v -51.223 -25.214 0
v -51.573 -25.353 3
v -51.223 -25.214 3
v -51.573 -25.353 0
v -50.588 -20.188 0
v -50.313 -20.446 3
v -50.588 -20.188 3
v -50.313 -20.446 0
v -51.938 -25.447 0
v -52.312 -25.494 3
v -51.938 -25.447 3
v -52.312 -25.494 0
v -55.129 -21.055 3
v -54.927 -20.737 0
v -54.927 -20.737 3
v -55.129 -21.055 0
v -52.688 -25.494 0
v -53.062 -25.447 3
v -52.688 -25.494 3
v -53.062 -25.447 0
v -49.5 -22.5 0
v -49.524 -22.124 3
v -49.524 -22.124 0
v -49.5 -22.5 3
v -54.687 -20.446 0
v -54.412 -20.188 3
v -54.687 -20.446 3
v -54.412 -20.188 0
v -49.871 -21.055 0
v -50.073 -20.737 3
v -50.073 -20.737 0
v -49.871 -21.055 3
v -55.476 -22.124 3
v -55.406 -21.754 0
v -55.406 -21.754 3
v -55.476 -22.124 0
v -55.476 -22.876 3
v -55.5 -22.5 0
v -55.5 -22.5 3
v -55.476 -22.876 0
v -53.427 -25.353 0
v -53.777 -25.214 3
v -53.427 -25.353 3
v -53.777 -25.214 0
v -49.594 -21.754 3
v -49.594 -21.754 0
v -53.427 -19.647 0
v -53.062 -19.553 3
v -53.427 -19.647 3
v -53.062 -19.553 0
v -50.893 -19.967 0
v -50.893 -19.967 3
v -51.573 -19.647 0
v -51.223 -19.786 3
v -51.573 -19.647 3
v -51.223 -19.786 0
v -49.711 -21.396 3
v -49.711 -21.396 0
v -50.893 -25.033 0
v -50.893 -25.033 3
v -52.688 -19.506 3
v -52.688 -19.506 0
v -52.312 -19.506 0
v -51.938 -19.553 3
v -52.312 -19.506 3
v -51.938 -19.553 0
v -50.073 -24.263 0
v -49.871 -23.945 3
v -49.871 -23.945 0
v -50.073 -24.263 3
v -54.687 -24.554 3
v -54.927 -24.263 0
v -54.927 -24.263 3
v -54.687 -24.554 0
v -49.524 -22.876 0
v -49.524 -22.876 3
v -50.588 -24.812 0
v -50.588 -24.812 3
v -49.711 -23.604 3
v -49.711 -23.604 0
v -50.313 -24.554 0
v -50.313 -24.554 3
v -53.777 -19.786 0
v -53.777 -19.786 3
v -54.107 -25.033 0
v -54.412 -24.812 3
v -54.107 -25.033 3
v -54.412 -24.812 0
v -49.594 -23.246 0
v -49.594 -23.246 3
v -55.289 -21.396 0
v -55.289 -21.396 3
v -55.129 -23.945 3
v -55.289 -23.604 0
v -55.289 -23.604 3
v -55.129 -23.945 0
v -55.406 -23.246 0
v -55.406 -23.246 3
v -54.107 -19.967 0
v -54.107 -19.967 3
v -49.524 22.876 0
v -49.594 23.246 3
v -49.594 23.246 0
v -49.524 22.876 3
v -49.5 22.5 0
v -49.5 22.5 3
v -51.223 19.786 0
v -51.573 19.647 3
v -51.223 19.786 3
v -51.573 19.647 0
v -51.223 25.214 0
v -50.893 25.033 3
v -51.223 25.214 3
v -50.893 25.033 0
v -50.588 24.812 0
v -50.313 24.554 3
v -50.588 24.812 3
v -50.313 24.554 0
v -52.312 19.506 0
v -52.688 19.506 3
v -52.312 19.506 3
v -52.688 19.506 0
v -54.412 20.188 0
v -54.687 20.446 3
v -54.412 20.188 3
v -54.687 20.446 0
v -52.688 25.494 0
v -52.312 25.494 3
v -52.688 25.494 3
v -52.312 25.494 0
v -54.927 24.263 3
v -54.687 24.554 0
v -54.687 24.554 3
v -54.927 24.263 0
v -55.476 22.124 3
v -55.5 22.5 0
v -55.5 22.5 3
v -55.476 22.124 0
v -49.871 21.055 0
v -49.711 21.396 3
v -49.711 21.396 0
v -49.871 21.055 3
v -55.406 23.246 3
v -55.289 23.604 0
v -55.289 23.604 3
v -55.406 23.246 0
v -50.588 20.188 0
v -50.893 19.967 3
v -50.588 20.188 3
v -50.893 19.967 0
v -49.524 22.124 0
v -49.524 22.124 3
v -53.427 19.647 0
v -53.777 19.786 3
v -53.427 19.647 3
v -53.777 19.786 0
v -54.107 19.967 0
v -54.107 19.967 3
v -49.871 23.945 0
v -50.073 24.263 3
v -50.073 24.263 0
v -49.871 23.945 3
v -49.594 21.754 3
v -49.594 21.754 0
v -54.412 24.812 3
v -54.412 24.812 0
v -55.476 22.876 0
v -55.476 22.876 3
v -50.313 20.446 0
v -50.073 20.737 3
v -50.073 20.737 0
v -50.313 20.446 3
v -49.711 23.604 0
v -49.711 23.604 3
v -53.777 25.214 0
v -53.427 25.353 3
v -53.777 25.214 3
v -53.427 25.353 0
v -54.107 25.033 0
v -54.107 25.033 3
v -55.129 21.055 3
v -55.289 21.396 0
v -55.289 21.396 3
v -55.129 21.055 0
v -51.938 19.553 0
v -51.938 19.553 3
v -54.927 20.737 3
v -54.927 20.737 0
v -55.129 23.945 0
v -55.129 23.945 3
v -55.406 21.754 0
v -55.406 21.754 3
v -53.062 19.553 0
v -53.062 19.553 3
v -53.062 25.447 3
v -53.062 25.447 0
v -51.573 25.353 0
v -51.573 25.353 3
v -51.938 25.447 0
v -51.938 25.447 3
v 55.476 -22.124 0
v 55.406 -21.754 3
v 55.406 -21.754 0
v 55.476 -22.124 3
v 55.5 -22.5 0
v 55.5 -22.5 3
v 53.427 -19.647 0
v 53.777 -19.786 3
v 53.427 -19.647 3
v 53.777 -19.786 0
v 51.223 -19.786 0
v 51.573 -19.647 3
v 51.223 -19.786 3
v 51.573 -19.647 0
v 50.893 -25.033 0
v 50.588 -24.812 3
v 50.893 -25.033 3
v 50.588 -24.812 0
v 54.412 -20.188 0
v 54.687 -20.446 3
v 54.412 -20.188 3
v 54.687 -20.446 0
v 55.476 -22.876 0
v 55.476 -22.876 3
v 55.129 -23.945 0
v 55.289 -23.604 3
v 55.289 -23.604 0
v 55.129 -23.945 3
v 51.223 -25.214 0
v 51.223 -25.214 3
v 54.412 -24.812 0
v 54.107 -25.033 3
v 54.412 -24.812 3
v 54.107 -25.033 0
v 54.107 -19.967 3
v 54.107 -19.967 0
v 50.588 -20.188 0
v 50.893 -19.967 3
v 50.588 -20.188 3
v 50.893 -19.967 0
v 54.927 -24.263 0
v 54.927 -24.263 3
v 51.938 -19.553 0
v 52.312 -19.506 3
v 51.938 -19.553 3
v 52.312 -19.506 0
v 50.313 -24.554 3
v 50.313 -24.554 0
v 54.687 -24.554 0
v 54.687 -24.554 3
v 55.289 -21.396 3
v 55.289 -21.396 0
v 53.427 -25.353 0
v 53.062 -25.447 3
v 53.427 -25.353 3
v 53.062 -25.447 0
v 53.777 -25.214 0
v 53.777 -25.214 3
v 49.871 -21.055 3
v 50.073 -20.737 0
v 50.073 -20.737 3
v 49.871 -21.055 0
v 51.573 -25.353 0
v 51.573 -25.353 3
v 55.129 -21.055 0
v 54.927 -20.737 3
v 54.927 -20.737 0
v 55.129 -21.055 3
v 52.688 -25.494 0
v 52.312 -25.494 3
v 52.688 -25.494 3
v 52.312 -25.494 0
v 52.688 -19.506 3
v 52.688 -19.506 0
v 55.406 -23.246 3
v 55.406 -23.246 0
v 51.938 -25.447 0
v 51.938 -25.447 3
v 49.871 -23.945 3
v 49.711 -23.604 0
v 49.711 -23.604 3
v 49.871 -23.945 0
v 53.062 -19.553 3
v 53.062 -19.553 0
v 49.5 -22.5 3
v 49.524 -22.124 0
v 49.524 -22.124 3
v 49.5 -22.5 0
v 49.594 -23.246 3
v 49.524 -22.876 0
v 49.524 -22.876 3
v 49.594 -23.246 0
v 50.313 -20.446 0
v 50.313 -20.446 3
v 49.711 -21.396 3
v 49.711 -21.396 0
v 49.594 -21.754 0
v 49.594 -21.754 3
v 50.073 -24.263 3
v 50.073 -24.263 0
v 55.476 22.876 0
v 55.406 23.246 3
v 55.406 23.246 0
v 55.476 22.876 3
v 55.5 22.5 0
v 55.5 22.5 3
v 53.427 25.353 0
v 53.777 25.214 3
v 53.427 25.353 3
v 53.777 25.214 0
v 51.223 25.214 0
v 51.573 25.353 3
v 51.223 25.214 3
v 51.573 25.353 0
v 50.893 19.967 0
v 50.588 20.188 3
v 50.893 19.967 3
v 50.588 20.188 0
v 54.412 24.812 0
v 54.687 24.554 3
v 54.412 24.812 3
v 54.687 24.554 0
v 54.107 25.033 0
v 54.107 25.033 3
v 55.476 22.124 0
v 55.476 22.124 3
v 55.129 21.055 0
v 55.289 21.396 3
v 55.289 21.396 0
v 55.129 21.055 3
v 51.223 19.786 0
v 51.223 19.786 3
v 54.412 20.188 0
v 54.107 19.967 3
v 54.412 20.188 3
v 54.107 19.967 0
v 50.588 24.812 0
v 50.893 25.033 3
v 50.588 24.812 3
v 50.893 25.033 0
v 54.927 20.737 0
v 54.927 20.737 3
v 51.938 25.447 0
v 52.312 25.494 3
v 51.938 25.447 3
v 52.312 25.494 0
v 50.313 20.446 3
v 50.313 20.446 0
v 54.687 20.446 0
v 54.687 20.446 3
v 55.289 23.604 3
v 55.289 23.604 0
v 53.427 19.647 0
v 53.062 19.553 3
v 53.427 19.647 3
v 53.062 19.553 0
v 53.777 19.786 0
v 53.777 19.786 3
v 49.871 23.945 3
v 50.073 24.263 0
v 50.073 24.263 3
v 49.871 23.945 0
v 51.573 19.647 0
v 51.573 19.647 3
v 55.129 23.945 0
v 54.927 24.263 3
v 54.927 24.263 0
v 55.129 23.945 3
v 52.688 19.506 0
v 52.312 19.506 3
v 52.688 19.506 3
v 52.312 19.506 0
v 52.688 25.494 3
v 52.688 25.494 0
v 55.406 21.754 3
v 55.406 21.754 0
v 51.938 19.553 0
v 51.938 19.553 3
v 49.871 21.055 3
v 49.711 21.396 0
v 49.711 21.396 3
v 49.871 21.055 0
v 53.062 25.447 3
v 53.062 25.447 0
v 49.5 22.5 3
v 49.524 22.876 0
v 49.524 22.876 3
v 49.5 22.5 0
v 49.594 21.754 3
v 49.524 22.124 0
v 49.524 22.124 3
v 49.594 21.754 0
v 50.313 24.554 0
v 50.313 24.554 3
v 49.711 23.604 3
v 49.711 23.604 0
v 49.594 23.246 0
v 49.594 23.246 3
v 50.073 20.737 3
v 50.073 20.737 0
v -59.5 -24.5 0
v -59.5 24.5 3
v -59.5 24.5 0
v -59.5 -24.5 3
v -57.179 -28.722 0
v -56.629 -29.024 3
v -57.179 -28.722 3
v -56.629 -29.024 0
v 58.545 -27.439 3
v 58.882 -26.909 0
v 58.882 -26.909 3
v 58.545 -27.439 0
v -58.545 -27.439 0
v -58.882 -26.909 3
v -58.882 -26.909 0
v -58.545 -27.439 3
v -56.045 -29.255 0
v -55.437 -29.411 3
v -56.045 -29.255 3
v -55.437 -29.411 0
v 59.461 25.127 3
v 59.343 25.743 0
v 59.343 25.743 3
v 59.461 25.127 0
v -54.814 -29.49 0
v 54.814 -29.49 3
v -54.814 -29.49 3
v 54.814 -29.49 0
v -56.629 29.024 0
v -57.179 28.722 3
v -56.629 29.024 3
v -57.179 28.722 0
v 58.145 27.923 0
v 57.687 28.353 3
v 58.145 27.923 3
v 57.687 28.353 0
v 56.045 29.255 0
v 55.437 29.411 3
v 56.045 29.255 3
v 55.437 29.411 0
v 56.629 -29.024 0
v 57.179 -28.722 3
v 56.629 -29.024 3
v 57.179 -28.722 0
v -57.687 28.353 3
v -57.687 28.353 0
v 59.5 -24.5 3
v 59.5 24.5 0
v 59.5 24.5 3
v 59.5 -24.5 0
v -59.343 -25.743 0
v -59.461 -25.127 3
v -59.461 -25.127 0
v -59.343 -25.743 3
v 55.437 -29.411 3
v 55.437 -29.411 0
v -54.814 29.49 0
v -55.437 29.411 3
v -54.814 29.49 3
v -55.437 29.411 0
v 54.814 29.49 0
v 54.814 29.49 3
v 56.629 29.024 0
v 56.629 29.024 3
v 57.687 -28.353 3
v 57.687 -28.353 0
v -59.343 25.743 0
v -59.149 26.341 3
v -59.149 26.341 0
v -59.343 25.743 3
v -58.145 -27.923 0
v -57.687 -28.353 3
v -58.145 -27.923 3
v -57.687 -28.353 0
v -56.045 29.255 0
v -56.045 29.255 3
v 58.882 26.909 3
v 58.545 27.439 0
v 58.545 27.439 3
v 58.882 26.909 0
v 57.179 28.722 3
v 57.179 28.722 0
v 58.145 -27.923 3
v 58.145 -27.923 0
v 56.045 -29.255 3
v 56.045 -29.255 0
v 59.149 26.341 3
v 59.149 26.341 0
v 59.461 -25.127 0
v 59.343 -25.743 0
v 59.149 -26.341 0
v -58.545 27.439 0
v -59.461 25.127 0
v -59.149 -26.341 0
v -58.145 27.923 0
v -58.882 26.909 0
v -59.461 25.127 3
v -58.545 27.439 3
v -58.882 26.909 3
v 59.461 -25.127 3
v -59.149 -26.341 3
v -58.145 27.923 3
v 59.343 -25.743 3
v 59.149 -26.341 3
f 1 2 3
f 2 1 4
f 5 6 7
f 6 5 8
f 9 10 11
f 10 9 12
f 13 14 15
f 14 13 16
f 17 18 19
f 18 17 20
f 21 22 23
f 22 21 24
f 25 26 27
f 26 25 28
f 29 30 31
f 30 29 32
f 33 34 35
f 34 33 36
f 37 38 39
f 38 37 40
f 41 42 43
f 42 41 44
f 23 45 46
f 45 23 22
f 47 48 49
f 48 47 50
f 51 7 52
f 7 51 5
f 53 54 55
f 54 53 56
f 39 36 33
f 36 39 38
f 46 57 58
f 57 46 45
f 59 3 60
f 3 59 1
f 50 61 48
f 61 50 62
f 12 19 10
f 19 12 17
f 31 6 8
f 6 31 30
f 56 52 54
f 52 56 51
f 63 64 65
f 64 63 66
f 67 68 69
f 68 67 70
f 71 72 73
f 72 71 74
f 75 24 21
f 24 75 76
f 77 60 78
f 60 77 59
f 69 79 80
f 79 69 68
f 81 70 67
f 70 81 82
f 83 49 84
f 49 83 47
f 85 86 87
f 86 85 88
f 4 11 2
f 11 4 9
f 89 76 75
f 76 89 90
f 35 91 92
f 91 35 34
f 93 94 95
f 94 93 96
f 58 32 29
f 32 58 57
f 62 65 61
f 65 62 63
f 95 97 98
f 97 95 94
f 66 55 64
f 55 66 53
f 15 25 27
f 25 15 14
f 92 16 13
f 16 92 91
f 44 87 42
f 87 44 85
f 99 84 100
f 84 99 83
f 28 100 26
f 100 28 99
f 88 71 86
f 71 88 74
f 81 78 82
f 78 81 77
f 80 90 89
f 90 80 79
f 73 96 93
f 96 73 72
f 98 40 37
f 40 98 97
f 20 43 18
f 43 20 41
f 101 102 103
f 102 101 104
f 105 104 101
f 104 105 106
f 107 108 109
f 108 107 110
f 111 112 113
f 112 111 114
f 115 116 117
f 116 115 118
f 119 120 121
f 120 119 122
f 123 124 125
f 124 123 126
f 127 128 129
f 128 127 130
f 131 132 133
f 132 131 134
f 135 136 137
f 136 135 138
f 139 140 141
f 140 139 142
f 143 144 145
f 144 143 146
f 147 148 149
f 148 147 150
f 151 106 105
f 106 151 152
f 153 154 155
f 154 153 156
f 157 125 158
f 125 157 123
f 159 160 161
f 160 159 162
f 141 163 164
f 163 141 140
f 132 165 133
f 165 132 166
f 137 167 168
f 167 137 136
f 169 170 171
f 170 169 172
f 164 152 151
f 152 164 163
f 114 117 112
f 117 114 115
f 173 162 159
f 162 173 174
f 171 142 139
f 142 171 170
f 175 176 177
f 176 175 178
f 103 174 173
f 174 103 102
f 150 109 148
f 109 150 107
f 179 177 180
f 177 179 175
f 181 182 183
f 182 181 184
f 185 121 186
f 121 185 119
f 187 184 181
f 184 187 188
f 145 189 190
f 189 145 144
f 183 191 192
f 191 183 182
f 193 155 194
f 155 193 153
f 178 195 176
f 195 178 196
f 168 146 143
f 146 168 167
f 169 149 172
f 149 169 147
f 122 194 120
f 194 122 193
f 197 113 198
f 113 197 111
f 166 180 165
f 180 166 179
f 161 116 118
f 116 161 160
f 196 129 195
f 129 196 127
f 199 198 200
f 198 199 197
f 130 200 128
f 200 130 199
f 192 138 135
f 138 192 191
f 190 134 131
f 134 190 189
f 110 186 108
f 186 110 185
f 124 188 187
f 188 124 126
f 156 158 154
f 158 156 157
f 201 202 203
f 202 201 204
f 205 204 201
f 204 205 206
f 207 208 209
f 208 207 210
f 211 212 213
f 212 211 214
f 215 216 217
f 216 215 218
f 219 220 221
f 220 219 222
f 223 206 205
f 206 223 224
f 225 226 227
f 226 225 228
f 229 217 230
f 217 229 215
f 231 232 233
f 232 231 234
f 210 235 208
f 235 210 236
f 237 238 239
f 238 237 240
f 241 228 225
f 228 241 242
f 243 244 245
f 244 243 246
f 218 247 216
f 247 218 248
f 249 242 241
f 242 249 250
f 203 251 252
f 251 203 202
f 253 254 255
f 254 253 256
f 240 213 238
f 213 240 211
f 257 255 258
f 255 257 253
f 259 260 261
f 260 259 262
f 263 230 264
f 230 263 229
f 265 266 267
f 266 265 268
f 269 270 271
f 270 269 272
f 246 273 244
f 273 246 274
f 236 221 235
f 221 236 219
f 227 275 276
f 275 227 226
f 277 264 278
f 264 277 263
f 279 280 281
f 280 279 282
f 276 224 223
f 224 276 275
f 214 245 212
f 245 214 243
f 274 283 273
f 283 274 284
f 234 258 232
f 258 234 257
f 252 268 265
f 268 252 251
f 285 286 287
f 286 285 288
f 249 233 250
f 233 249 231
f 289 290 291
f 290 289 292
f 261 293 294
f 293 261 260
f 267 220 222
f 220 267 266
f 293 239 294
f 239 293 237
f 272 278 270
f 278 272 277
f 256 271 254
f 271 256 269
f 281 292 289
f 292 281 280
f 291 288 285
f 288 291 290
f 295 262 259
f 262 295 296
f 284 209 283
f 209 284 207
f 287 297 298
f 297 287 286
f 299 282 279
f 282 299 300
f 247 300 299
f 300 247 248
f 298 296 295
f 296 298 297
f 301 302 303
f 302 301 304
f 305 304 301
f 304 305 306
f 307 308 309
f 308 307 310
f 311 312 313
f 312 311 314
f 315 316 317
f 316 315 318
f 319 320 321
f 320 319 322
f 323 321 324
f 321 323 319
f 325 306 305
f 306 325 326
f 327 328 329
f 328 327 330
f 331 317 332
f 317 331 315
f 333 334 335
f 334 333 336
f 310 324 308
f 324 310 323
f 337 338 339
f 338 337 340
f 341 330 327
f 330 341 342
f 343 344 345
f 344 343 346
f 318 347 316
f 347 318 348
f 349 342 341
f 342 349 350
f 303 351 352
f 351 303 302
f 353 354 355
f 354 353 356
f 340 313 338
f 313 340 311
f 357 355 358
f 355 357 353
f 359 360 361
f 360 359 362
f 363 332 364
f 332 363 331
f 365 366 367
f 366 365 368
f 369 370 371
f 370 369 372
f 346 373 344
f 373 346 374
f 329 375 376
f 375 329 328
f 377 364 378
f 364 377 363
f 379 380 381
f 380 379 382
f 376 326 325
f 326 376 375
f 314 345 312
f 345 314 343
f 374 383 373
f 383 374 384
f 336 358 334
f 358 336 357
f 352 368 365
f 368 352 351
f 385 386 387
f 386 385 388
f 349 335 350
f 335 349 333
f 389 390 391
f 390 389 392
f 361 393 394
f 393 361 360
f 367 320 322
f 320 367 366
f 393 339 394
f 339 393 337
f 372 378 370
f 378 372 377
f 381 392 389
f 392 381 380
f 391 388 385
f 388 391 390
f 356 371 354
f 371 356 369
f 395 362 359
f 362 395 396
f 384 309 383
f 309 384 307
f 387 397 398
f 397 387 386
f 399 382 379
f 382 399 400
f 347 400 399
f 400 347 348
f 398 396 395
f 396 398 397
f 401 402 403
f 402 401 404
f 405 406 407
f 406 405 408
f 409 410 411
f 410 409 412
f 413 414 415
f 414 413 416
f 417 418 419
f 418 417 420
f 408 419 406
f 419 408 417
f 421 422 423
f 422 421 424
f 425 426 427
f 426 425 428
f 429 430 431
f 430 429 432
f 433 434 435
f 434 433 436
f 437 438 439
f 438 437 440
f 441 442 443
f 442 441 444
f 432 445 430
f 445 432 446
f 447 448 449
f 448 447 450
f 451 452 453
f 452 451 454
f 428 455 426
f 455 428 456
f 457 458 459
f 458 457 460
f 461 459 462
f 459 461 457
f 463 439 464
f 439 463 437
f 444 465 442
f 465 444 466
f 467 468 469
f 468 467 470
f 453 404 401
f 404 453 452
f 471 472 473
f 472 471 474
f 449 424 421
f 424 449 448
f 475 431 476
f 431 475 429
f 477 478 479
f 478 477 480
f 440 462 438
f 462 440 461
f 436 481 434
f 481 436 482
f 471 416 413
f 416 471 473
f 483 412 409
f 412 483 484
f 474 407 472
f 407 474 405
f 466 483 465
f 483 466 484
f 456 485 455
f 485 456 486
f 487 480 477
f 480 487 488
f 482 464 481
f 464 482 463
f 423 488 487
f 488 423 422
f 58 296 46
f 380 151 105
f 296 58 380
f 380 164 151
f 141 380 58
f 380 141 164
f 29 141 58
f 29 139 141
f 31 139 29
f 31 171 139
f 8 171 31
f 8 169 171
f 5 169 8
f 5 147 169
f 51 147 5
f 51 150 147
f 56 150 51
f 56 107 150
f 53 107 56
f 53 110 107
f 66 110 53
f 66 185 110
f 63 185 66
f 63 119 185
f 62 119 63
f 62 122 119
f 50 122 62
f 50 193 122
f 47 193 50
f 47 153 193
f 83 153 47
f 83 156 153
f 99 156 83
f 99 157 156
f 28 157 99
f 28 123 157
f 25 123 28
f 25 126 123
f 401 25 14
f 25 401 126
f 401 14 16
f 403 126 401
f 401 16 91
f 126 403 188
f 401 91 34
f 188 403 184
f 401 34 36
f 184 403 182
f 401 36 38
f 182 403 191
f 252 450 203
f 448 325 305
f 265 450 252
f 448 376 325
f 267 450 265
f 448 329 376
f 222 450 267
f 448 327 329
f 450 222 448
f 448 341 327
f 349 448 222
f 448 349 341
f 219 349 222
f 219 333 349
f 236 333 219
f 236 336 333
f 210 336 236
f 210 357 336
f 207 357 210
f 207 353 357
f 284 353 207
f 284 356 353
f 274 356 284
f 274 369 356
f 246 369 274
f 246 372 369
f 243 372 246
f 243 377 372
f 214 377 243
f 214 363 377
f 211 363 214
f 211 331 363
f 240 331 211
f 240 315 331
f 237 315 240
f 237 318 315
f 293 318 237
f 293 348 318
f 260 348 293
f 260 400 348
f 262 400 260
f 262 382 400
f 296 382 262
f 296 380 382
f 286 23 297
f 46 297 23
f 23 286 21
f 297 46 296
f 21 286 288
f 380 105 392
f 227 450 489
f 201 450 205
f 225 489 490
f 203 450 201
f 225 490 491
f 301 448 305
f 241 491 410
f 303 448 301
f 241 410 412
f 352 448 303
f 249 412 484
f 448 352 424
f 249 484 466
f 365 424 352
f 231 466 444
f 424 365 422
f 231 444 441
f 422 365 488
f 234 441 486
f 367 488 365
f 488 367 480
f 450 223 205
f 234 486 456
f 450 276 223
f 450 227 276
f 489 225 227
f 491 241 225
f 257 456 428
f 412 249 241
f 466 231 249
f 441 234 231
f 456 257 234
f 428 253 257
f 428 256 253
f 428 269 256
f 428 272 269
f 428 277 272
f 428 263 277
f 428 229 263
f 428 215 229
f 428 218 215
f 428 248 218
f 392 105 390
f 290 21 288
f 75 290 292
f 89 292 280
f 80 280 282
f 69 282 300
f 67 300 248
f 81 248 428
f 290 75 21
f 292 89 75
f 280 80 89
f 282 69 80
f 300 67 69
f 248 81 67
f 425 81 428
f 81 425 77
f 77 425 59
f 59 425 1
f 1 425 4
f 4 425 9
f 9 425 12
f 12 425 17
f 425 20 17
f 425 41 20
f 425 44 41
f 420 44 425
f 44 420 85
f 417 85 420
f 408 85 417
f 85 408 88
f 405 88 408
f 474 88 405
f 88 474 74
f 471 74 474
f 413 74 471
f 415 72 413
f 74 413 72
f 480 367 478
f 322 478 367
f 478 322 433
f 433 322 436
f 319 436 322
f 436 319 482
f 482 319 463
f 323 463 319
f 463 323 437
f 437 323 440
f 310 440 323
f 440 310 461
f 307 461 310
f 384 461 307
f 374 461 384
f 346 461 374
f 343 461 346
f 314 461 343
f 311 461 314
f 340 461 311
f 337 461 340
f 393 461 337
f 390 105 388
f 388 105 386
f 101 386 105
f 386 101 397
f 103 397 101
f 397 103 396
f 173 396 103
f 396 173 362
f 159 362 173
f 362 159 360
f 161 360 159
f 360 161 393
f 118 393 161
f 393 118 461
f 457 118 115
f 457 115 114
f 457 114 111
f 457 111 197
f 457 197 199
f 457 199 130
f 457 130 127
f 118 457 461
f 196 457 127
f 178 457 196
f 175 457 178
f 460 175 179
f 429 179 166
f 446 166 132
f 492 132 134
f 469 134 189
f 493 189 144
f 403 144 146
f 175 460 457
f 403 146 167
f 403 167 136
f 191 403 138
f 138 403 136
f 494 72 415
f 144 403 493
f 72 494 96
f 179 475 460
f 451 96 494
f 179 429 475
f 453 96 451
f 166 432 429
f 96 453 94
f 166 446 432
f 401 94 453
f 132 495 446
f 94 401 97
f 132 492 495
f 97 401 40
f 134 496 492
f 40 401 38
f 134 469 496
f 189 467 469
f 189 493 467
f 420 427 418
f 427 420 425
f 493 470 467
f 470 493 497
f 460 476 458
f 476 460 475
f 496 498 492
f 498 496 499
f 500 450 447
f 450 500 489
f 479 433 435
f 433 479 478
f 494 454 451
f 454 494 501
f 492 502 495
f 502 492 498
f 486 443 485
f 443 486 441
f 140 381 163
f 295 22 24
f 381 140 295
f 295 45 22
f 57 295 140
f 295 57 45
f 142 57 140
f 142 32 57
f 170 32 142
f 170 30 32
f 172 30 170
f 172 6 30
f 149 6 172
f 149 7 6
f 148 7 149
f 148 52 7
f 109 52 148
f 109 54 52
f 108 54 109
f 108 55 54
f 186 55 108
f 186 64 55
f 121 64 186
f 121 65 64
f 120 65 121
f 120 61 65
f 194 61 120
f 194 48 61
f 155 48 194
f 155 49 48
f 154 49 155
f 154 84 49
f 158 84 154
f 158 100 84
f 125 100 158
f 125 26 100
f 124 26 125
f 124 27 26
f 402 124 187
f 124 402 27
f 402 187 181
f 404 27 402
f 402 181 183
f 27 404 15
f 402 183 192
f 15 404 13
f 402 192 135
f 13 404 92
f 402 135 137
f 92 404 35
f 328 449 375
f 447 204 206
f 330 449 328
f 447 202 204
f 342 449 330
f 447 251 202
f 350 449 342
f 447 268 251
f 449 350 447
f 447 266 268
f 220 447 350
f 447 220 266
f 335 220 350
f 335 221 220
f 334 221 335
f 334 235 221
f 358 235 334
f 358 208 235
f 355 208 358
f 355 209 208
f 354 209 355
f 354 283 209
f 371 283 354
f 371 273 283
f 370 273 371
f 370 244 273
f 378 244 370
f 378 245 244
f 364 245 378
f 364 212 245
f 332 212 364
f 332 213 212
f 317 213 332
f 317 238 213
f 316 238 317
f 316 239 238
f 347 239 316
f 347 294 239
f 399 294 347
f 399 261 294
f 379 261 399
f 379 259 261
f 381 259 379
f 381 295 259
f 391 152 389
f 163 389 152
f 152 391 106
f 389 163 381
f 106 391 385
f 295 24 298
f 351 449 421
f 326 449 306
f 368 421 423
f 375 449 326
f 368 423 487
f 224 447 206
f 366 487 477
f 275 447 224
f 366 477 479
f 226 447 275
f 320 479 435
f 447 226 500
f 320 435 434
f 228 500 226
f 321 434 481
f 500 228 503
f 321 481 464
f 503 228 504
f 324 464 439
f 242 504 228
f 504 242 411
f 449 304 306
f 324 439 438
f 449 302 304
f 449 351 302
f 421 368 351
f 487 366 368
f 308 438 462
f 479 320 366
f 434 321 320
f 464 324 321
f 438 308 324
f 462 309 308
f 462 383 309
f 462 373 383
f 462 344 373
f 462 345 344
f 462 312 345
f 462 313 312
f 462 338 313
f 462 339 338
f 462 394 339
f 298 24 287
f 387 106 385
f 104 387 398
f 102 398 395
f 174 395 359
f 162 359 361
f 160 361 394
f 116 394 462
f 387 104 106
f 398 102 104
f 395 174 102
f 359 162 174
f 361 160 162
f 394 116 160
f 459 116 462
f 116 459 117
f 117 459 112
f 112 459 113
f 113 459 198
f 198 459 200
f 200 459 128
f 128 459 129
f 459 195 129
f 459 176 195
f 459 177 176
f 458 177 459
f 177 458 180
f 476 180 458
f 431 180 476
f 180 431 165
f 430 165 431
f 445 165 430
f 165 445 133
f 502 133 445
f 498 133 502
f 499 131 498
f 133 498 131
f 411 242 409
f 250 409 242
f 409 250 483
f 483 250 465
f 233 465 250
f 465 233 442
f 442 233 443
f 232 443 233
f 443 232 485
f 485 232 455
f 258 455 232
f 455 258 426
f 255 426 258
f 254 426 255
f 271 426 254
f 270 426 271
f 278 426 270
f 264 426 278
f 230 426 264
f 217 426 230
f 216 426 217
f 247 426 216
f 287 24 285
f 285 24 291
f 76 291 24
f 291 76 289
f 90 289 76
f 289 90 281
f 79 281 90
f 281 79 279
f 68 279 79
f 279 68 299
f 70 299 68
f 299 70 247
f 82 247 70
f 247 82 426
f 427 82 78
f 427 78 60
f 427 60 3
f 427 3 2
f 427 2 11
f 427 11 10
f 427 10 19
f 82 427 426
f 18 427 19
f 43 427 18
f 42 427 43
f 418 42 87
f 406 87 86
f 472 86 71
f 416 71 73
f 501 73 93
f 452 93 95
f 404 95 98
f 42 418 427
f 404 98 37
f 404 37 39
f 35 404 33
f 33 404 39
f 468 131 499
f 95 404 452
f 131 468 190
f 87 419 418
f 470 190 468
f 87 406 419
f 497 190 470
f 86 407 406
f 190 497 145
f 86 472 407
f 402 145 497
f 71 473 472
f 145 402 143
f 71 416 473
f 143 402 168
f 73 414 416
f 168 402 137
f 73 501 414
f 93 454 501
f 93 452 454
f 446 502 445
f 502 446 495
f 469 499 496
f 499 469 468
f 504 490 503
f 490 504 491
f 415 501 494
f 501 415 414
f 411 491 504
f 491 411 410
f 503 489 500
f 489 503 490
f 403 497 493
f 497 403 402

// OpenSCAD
$fn = 50;


difference() {
	union() {
		hull() {
			translate(v = [-54.5000000000, 24.5000000000, 0]) {
				cylinder(h = 3, r = 5);
			}
			translate(v = [54.5000000000, 24.5000000000, 0]) {
				cylinder(h = 3, r = 5);
			}
			translate(v = [-54.5000000000, -24.5000000000, 0]) {
				cylinder(h = 3, r = 5);
			}
			translate(v = [54.5000000000, -24.5000000000, 0]) {
				cylinder(h = 3, r = 5);
			}
		}
	}
	union() {
		translate(v = [-52.5000000000, -22.5000000000, -100.0000000000]) {
			cylinder(h = 200, r = 3.0000000000);
		}
		translate(v = [-52.5000000000, 22.5000000000, -100.0000000000]) {
			cylinder(h = 200, r = 3.0000000000);
		}
		translate(v = [52.5000000000, -22.5000000000, -100.0000000000]) {
			cylinder(h = 200, r = 3.0000000000);
		}
		translate(v = [52.5000000000, 22.5000000000, -100.0000000000]) {
			cylinder(h = 200, r = 3.0000000000);
		}
	}
}
